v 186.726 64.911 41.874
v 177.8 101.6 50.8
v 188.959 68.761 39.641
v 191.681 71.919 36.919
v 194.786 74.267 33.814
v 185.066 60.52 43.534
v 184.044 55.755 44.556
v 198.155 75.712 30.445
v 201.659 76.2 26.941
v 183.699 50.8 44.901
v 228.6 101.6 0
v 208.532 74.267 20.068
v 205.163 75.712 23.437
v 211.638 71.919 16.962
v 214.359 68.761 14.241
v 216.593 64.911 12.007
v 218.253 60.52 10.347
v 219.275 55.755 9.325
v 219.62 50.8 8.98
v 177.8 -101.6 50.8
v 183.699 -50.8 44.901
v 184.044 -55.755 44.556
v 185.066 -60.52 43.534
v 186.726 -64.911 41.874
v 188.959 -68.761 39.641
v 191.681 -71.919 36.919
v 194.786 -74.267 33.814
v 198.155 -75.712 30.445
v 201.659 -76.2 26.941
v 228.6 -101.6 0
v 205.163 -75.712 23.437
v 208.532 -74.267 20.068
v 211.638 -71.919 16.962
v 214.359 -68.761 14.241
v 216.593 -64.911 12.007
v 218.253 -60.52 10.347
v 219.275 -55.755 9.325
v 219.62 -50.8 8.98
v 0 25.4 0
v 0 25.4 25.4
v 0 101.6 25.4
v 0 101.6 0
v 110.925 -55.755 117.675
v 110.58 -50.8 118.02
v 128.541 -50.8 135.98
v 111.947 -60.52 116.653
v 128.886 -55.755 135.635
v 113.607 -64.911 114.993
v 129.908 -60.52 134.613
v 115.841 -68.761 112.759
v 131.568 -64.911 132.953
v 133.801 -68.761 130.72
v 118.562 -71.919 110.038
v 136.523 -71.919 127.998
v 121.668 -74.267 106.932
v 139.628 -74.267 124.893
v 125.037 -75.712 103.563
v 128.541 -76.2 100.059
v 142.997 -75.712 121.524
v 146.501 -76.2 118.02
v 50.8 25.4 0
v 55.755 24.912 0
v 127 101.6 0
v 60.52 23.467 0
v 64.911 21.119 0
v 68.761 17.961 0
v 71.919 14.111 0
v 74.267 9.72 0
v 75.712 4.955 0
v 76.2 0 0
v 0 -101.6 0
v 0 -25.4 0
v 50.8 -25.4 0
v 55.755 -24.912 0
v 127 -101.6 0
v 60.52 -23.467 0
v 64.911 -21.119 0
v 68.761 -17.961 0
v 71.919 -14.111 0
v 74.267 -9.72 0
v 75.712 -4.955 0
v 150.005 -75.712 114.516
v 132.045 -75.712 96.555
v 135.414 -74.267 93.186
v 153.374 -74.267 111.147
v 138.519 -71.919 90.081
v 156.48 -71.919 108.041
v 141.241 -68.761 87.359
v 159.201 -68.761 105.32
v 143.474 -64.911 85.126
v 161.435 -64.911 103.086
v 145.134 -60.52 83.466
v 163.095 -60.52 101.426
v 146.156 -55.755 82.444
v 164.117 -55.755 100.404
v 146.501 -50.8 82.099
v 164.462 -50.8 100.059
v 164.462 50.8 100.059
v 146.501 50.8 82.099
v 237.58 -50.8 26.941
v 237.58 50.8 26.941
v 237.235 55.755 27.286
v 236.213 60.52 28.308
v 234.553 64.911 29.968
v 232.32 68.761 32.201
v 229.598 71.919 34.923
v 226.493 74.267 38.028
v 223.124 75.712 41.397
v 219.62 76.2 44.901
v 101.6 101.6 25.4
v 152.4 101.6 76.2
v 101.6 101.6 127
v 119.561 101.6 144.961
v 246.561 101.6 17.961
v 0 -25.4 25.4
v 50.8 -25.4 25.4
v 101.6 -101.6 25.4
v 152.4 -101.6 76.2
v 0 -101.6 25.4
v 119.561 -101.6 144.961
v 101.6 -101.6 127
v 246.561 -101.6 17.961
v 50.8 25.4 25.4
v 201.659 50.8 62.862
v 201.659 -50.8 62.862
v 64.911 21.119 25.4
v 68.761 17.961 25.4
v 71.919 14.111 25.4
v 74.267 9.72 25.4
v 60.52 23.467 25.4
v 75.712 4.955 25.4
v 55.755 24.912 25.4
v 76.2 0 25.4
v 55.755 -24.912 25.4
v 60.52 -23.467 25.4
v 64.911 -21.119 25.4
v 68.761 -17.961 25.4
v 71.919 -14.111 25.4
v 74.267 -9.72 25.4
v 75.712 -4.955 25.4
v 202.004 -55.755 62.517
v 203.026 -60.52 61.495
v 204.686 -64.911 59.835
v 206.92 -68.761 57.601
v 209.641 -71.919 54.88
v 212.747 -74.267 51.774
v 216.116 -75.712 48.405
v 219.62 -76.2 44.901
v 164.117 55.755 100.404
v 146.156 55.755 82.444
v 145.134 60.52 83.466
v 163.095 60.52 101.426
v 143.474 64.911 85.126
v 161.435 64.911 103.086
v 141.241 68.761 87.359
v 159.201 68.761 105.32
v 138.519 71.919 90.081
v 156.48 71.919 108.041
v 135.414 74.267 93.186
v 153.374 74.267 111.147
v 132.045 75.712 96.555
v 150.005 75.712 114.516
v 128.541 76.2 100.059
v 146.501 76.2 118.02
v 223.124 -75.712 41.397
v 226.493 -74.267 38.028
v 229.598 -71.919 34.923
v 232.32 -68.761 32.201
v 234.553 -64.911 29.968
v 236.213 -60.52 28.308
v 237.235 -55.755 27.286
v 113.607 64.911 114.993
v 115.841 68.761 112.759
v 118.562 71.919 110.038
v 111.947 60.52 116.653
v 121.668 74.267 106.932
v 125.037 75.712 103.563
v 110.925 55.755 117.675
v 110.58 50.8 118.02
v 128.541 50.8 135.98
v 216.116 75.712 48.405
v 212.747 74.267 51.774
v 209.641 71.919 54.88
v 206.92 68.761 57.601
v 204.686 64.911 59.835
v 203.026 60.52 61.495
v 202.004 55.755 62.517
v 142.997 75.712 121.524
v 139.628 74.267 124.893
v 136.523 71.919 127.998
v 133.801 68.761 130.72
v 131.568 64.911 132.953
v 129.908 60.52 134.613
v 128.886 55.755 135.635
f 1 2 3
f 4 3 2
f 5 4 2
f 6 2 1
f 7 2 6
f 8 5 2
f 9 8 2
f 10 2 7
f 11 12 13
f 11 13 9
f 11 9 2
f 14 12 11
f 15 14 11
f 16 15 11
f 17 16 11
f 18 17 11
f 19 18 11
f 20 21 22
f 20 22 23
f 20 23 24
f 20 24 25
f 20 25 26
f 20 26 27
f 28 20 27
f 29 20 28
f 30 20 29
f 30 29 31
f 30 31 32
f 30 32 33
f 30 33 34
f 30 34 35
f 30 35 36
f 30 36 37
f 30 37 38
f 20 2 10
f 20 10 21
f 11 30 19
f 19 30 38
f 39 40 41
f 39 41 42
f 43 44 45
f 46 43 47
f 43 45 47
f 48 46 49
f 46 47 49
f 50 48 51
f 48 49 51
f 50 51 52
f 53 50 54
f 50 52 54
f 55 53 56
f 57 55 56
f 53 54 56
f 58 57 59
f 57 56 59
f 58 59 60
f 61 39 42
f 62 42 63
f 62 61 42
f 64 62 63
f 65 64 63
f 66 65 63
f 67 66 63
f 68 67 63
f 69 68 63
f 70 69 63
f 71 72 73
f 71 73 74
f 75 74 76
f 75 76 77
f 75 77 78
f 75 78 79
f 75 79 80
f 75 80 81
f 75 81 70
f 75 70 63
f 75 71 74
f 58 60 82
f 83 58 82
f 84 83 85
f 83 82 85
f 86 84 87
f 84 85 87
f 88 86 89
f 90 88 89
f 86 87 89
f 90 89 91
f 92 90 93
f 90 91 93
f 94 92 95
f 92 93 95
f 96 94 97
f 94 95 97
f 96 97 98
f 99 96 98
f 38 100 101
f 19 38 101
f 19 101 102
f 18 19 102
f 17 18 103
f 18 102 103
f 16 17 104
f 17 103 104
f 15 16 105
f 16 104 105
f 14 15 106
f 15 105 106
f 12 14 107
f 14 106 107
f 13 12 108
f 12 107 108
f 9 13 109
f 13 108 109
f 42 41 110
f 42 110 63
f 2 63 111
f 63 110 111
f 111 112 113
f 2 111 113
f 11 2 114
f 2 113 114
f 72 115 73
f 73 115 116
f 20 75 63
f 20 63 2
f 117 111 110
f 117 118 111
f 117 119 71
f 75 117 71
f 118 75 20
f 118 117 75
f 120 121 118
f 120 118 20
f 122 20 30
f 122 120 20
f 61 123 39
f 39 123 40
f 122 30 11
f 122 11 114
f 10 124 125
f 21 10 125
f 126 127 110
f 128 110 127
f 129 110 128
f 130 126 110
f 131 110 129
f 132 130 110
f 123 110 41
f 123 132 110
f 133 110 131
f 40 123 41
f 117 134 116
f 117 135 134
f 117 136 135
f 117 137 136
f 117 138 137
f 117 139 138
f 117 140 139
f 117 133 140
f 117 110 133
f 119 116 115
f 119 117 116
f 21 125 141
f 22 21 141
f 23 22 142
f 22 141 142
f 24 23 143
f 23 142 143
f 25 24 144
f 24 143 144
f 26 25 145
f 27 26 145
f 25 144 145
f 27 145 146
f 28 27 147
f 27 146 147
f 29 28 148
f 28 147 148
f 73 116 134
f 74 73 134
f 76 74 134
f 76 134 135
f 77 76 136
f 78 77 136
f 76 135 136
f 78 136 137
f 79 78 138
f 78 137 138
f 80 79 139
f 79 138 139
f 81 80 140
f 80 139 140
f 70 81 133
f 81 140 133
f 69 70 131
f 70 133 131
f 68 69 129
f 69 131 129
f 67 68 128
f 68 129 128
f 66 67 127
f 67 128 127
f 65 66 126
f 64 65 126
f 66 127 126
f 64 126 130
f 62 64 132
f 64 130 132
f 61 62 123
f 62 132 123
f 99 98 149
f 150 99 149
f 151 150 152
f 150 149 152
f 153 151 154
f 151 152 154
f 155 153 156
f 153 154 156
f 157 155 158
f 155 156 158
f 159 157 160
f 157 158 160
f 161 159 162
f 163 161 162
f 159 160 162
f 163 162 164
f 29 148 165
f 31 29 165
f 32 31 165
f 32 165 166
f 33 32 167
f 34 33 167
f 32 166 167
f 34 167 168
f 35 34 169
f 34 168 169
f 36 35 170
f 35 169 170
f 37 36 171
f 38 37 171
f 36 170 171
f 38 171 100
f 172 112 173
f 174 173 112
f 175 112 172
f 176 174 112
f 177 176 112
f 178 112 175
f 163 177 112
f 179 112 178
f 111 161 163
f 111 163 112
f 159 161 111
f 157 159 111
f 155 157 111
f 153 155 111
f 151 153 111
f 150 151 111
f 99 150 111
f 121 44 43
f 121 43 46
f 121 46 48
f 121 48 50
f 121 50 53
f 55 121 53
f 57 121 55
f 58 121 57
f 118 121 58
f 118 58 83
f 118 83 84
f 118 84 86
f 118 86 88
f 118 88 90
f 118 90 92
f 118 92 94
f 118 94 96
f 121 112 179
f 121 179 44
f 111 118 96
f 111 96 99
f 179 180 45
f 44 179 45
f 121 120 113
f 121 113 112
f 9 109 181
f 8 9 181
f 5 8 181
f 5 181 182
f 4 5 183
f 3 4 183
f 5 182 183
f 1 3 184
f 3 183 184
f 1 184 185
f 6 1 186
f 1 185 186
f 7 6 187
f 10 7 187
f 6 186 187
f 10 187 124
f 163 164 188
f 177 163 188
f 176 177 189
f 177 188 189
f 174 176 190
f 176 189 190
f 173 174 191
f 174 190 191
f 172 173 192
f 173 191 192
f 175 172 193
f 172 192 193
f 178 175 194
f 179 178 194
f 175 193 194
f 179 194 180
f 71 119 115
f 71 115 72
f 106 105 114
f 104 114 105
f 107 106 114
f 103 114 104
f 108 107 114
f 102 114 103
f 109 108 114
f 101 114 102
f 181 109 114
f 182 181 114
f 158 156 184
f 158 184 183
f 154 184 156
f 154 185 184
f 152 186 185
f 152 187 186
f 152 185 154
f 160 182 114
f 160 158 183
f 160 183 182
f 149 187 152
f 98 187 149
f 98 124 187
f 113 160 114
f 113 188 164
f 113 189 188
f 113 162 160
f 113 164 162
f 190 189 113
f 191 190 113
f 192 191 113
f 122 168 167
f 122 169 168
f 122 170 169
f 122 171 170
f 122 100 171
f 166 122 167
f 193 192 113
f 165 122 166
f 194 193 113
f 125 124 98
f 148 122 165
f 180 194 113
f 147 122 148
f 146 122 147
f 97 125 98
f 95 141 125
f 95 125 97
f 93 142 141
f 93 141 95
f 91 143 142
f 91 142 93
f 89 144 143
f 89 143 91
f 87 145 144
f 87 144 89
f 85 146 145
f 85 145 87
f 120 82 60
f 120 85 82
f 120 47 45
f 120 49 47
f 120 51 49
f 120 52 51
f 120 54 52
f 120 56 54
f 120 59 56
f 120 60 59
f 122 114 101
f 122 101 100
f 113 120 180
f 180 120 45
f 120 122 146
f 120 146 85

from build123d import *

# Parameters (mm, degrees)
F1_DEPTH = 101.6
F3_DEPTH = 50.8
F5_DEPTH = 38.1


with BuildPart() as f1:
    # F0 (on Front) → F1 (new body, symmetric)
    with BuildSketch(Plane.XZ):
        Polygon((0, 25.4), (0, 0), (127, 0), (177.8, 50.8), (228.6, 0), (246.560512, 17.960512), (119.560512, 144.960512), (101.6, 127), (152.4, 76.2), (101.6, 25.4), align=None)
    extrude(amount=F1_DEPTH, both=True)

    # F2 (on face) → F3 (cut)
    with BuildSketch(Plane(origin=(132.260512, 0, 132.260512), x_dir=(0.707107, 0, -0.707107), z_dir=(0.707107, 0, 0.707107))):
        with BuildLine():
            ThreePointArc((123.54461, -76.2), (141.505122, -68.760512), (148.94461, -50.8))
            Line((148.94461, -50.8), (148.94461, 50.8))
            ThreePointArc((148.94461, 50.8), (141.505122, 68.760512), (123.54461, 76.2))
            ThreePointArc((123.54461, 76.2), (105.584098, 68.760512), (98.14461, 50.8))
            Line((98.14461, 50.8), (98.14461, -50.8))
            ThreePointArc((98.14461, -50.8), (105.584098, -68.760512), (123.54461, -76.2))
        make_face()
        with BuildLine():
            Line((-5.260512, 50.8), (-5.260512, -50.8))
            ThreePointArc((-5.260512, -50.8), (2.178976, -68.760512), (20.139488, -76.2))
            ThreePointArc((20.139488, -76.2), (38.1, -68.760512), (45.539488, -50.8))
            Line((45.539488, -50.8), (45.539488, 50.8))
            ThreePointArc((45.539488, 50.8), (38.1, 68.760512), (20.139488, 76.2))
            ThreePointArc((20.139488, 76.2), (2.178976, 68.760512), (-5.260512, 50.8))
        make_face()
    extrude(amount=-F3_DEPTH, mode=Mode.SUBTRACT)

    # F4 (on face) → F5 (cut)
    with BuildSketch(Plane.XY.offset(25.4)):
        with BuildLine():
            Line((0, -25.4), (50.8, -25.4))
            ThreePointArc((50.8, -25.4), (76.2, 0), (50.8, 25.4))
            Line((50.8, 25.4), (0, 25.4))
            Line((0, 25.4), (0, -25.4))
        make_face()
    extrude(amount=-F5_DEPTH, mode=Mode.SUBTRACT)


solid = f1.part
